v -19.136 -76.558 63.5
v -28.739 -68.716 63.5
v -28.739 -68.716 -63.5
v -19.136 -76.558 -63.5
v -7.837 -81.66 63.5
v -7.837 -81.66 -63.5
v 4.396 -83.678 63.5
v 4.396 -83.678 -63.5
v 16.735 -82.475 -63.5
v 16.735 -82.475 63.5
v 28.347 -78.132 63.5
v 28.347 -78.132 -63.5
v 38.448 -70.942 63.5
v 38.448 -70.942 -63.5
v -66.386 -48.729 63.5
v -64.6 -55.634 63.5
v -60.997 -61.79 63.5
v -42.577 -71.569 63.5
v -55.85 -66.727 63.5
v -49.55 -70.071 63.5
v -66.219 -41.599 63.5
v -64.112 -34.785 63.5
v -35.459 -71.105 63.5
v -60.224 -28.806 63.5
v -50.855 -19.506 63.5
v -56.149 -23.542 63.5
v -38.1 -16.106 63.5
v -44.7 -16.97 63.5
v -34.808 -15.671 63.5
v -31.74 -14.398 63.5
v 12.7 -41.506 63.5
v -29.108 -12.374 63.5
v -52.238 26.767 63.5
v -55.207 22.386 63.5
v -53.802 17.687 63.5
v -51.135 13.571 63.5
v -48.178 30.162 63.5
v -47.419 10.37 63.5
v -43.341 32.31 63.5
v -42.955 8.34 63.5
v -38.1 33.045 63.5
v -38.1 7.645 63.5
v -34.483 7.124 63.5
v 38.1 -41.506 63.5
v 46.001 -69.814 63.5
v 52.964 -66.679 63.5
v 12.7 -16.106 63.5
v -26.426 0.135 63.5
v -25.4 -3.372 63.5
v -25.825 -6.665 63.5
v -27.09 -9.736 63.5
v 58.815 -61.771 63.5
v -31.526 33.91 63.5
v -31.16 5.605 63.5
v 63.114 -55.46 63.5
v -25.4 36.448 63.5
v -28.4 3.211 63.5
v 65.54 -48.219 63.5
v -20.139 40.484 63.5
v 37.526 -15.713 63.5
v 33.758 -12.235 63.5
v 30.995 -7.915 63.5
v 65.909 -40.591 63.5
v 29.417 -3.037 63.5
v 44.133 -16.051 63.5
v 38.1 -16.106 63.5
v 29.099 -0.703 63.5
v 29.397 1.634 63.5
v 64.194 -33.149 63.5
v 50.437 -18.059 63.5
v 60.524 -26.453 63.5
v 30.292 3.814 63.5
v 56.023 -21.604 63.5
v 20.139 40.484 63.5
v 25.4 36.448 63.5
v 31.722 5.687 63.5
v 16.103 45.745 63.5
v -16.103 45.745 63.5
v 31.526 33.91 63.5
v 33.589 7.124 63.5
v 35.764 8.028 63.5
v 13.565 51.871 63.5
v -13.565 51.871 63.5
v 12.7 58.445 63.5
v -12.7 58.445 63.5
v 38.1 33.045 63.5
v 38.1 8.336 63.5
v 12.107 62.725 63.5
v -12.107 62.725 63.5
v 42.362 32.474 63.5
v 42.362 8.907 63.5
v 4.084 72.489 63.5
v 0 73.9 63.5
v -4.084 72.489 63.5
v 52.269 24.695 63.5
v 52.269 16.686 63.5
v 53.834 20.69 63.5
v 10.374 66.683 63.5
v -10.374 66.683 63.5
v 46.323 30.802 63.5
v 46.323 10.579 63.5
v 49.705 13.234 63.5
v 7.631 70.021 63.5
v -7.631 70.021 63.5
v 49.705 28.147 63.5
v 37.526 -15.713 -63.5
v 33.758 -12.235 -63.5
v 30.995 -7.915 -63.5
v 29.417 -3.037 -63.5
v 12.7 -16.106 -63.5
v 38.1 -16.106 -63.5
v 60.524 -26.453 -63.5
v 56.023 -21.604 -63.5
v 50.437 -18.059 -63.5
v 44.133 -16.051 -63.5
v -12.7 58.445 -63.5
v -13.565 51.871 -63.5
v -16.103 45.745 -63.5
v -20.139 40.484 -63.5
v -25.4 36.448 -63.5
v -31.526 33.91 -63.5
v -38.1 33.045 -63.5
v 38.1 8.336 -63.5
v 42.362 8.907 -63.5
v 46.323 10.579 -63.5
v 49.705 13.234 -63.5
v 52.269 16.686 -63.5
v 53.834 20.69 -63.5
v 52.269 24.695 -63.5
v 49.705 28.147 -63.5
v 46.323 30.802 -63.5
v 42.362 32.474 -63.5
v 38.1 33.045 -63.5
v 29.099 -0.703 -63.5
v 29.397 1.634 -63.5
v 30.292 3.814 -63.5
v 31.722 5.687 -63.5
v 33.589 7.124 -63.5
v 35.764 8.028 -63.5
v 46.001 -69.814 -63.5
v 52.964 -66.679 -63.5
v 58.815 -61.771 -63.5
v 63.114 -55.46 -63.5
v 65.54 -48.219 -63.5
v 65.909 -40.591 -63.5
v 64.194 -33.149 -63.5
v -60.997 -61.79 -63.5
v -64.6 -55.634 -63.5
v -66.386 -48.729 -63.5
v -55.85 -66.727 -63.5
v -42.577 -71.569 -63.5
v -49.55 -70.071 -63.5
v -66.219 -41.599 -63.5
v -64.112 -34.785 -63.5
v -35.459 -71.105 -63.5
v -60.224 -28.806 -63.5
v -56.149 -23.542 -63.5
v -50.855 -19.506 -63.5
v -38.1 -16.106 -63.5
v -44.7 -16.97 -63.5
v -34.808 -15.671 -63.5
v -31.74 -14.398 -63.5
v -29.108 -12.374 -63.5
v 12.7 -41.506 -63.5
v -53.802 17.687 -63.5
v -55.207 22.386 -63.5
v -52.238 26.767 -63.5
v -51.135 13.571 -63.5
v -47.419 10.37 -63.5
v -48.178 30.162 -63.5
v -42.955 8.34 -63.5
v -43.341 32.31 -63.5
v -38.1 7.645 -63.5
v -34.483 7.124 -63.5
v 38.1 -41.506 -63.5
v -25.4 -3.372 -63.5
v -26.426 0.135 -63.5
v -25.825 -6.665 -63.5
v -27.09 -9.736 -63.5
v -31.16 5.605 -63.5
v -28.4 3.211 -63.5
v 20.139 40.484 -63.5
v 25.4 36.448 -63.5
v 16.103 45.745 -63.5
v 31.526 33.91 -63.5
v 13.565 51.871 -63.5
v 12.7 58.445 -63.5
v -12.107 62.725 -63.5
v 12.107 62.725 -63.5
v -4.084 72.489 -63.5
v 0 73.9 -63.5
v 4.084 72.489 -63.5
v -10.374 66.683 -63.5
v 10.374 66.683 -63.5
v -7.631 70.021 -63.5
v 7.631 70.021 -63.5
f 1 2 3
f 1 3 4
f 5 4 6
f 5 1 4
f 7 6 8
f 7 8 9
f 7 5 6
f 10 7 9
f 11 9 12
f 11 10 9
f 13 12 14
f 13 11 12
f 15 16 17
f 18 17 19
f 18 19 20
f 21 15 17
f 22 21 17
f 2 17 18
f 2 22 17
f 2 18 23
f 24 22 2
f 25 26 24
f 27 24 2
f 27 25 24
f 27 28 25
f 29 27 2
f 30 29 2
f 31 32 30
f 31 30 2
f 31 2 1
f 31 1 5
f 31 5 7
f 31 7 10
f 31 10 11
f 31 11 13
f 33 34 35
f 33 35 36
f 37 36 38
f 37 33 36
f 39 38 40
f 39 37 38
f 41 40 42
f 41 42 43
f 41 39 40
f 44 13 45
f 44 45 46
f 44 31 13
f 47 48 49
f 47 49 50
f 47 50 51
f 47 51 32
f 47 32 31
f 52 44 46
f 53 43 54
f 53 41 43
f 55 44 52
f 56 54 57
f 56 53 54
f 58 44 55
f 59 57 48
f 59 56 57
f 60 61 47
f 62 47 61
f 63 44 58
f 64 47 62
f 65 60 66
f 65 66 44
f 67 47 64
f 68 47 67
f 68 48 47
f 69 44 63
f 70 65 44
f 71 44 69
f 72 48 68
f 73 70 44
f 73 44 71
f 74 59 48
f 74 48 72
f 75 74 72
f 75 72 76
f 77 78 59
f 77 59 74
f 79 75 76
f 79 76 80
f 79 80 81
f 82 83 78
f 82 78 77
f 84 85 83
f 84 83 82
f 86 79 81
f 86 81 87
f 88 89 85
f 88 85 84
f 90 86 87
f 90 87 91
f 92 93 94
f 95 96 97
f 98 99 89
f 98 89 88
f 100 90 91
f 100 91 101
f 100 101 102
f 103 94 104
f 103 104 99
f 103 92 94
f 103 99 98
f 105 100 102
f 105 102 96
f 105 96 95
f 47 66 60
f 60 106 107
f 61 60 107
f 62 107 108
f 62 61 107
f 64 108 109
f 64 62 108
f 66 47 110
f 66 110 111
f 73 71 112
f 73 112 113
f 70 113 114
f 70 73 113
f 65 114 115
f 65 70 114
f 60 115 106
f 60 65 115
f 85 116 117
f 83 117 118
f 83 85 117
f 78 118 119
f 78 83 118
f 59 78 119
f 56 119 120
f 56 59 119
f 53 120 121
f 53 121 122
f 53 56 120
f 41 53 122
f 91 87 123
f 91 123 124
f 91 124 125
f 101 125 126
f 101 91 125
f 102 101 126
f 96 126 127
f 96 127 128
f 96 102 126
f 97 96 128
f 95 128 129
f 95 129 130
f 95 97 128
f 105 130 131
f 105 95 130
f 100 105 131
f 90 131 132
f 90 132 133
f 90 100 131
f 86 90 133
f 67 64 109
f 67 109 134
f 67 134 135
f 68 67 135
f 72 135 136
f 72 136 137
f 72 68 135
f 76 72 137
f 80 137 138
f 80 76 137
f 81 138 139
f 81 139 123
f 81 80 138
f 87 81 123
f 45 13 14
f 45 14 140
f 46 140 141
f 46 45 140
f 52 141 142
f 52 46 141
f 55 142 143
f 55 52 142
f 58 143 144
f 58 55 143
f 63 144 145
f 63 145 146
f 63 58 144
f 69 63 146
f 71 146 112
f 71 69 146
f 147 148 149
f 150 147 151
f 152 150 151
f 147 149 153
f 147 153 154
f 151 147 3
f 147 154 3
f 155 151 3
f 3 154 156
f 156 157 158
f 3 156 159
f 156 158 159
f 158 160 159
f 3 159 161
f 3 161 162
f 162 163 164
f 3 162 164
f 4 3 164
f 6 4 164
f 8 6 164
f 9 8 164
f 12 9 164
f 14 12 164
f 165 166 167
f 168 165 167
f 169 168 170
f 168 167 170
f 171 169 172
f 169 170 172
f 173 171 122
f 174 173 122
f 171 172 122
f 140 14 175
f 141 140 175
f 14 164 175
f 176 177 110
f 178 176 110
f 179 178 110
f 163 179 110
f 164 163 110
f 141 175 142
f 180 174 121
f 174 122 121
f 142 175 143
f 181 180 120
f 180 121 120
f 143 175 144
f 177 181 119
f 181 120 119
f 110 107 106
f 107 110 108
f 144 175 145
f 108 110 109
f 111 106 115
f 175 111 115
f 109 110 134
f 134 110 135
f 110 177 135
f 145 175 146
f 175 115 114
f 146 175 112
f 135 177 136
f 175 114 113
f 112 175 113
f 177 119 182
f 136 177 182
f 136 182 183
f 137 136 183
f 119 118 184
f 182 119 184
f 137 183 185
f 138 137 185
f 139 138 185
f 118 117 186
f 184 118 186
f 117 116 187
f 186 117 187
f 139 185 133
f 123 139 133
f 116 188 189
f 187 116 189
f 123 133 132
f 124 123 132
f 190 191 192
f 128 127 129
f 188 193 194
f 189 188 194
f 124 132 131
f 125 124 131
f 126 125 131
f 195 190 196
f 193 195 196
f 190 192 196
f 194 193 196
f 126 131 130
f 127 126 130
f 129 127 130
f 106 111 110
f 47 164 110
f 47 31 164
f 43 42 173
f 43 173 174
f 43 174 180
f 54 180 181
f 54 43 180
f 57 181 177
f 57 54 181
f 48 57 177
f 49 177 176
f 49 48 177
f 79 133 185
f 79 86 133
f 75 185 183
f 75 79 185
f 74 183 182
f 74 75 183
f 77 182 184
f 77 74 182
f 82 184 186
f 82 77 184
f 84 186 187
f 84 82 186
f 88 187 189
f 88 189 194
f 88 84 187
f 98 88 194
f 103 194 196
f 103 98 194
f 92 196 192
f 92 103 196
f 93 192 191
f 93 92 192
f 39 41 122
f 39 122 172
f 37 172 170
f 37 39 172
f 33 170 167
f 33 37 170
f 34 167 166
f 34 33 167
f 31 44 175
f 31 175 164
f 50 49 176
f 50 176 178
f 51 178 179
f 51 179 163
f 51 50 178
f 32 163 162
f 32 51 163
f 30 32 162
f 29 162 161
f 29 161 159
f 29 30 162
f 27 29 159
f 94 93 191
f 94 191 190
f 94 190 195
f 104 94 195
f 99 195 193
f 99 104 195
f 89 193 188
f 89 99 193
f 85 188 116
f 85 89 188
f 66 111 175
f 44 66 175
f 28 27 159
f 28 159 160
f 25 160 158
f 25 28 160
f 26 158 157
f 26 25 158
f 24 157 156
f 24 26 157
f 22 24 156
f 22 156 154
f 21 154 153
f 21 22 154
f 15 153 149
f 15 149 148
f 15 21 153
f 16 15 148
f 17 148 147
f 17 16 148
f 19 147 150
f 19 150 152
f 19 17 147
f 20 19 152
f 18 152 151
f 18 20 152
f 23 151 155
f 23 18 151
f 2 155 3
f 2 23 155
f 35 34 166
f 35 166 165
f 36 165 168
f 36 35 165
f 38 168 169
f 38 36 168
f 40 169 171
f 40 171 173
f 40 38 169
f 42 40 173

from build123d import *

# Parameters (mm, degrees)
F0_W     = 25.4
F0_H     = 25.4
F1_DEPTH = 63.5


with BuildPart() as f1:
    # F0 (on Top) → F1 (new body, symmetric)
    with BuildSketch(Plane.XY):
        with BuildLine():
            Line((-12.7, 58.4446051985), (0, 58.4446051985))
            Line((0, 58.4446051985), (12.7, 58.4446051985))
            ThreePointArc((12.7, 58.4446051985), (9.1177237853, 68.4465950708), (0, 73.8999992609))
            ThreePointArc((0, 73.8999992609), (-9.1177237853, 68.4465950708), (-12.7, 58.4446051985))
        make_face()
        Polygon((12.7, 58.4446051985), (0, 58.4446051985), (-12.7, 58.4446051985), (-12.7, 33.0446051985), (-38.1, 33.0446051985), (-38.1, 7.6446051985), (-12.7, 7.6446051985), (-12.7, -16.1055155754), (-12.7, -41.5055155754), (-12.7, -49.8682335019), (12.7, -49.8682335019), (12.7, -41.5055155754), (12.7, -16.1055155754), (12.7, 8.3362860605), (38.1, 8.3362860605), (38.1, 33.0446051985), (12.7, 33.0446051985), (12.7, 45.7446051985), align=None)
        with BuildLine():
            ThreePointArc((38.1, 33.0446051985), (20.1394877579, 40.4840929564), (12.7, 58.4446051985))
            Line((12.7, 58.4446051985), (12.7, 45.7446051985))
            Line((12.7, 45.7446051985), (12.7, 33.0446051985))
            Line((12.7, 33.0446051985), (38.1, 33.0446051985))
        make_face()
        with BuildLine():
            Line((-12.7, 33.0446051985), (-12.7, 58.4446051985))
            ThreePointArc((-12.7, 58.4446051985), (-20.1394877579, 40.4840929564), (-38.1, 33.0446051985))
            Line((-38.1, 33.0446051985), (-12.7, 33.0446051985))
        make_face()
        with BuildLine():
            ThreePointArc((53.8339801133, 20.6904456295), (48.1022920981, 29.5869981283), (38.1, 33.0446051985))
            Line((38.1, 33.0446051985), (38.1, 8.3362860605))
            ThreePointArc((38.1, 8.3362860605), (48.1022920981, 11.7938931307), (53.8339801133, 20.6904456295))
        make_face()
        with BuildLine():
            Line((-38.1, 7.6446051985), (-38.1, 33.0446051985))
            ThreePointArc((-38.1, 33.0446051985), (-48.1779241379, 30.1618280155), (-55.2068687975, 22.3856531084))
            ThreePointArc((-55.2068687975, 22.3856531084), (-49.3909637934, 11.8382480748), (-38.1, 7.6446051985))
        make_face()
        with BuildLine():
            ThreePointArc((29.4168628752, -3.037011018), (30.9454777105, 4.7972348951), (38.1, 8.3362860605))
            Line((38.1, 8.3362860605), (12.7, 8.3362860605))
            Line((12.7, 8.3362860605), (12.7, -16.1055155754))
            Line((12.7, -16.1055155754), (38.1, -16.1055155754))
            ThreePointArc((38.1, -16.1055155754), (37.8112363374, -15.9115868292), (37.5258770827, -15.7126825627))
            ThreePointArc((37.5258770827, -15.7126825627), (32.2384158105, -10.1636052268), (29.4168628752, -3.037011018))
        make_face()
        with BuildLine():
            Line((-12.7, 7.6446051985), (-38.1, 7.6446051985))
            ThreePointArc((-38.1, 7.6446051985), (-29.6939751713, 4.5068420563), (-25.4, -3.3715199679))
            ThreePointArc((-25.4, -3.3715199679), (-29.107716584, -12.3737471543), (-38.1, -16.1055155754))
            Line((-38.1, -16.1055155754), (-12.7, -16.1055155754))
            Line((-12.7, -16.1055155754), (-12.7, 7.6446051985))
        make_face()
        with BuildLine():
            ThreePointArc((60.5236142874, -26.4526233077), (50.436987874, -18.0585790132), (37.5258770827, -15.7126825627))
            ThreePointArc((37.5258770827, -15.7126825627), (37.8112363374, -15.9115868292), (38.1, -16.1055155754))
            Line((38.1, -16.1055155754), (38.1, -41.5055155754))
            Line((38.1, -41.5055155754), (12.7, -41.5055155754))
            Line((12.7, -41.5055155754), (12.7, -49.8682335019))
            Line((12.7, -49.8682335019), (-12.7, -49.8682335019))
            Line((-12.7, -49.8682335019), (-12.7, -41.5055155754))
            Line((-12.7, -41.5055155754), (-38.1, -41.5055155754))
            ThreePointArc((-38.1, -41.5055155754), (-37.9658127793, -56.6748011531), (-28.7389459174, -68.7159871021))
            ThreePointArc((-28.7389459174, -68.7159871021), (4.3955551034, -83.6780580167), (38.4478494525, -70.9422826767))
            ThreePointArc((38.4478494525, -70.9422826767), (63.1143336959, -55.4599639488), (60.5236142874, -26.4526233077))
        make_face()
        with Locations((-25.4, -28.8055155754)):
            Rectangle(F0_W, F0_H)
        with BuildLine():
            Line((-38.1, -41.5055155754), (-38.1, -16.1055155754))
            ThreePointArc((-38.1, -16.1055155754), (-50.8550498174, -19.5062062845), (-60.2240860462, -28.8055155754))
            ThreePointArc((-60.2240860462, -28.8055155754), (-50.8550498174, -38.1048248663), (-38.1, -41.5055155754))
        make_face()
        with BuildLine():
            ThreePointArc((-28.7389459174, -68.7159871021), (-37.9658127793, -56.6748011531), (-38.1, -41.5055155754))
            ThreePointArc((-38.1, -41.5055155754), (-50.8550498174, -38.1048248663), (-60.2240860462, -28.8055155754))
            ThreePointArc((-60.2240860462, -28.8055155754), (-60.9967813298, -61.7895486407), (-28.7389459174, -68.7159871021))
        make_face()
    extrude(amount=F1_DEPTH, both=True)


solid = f1.part
